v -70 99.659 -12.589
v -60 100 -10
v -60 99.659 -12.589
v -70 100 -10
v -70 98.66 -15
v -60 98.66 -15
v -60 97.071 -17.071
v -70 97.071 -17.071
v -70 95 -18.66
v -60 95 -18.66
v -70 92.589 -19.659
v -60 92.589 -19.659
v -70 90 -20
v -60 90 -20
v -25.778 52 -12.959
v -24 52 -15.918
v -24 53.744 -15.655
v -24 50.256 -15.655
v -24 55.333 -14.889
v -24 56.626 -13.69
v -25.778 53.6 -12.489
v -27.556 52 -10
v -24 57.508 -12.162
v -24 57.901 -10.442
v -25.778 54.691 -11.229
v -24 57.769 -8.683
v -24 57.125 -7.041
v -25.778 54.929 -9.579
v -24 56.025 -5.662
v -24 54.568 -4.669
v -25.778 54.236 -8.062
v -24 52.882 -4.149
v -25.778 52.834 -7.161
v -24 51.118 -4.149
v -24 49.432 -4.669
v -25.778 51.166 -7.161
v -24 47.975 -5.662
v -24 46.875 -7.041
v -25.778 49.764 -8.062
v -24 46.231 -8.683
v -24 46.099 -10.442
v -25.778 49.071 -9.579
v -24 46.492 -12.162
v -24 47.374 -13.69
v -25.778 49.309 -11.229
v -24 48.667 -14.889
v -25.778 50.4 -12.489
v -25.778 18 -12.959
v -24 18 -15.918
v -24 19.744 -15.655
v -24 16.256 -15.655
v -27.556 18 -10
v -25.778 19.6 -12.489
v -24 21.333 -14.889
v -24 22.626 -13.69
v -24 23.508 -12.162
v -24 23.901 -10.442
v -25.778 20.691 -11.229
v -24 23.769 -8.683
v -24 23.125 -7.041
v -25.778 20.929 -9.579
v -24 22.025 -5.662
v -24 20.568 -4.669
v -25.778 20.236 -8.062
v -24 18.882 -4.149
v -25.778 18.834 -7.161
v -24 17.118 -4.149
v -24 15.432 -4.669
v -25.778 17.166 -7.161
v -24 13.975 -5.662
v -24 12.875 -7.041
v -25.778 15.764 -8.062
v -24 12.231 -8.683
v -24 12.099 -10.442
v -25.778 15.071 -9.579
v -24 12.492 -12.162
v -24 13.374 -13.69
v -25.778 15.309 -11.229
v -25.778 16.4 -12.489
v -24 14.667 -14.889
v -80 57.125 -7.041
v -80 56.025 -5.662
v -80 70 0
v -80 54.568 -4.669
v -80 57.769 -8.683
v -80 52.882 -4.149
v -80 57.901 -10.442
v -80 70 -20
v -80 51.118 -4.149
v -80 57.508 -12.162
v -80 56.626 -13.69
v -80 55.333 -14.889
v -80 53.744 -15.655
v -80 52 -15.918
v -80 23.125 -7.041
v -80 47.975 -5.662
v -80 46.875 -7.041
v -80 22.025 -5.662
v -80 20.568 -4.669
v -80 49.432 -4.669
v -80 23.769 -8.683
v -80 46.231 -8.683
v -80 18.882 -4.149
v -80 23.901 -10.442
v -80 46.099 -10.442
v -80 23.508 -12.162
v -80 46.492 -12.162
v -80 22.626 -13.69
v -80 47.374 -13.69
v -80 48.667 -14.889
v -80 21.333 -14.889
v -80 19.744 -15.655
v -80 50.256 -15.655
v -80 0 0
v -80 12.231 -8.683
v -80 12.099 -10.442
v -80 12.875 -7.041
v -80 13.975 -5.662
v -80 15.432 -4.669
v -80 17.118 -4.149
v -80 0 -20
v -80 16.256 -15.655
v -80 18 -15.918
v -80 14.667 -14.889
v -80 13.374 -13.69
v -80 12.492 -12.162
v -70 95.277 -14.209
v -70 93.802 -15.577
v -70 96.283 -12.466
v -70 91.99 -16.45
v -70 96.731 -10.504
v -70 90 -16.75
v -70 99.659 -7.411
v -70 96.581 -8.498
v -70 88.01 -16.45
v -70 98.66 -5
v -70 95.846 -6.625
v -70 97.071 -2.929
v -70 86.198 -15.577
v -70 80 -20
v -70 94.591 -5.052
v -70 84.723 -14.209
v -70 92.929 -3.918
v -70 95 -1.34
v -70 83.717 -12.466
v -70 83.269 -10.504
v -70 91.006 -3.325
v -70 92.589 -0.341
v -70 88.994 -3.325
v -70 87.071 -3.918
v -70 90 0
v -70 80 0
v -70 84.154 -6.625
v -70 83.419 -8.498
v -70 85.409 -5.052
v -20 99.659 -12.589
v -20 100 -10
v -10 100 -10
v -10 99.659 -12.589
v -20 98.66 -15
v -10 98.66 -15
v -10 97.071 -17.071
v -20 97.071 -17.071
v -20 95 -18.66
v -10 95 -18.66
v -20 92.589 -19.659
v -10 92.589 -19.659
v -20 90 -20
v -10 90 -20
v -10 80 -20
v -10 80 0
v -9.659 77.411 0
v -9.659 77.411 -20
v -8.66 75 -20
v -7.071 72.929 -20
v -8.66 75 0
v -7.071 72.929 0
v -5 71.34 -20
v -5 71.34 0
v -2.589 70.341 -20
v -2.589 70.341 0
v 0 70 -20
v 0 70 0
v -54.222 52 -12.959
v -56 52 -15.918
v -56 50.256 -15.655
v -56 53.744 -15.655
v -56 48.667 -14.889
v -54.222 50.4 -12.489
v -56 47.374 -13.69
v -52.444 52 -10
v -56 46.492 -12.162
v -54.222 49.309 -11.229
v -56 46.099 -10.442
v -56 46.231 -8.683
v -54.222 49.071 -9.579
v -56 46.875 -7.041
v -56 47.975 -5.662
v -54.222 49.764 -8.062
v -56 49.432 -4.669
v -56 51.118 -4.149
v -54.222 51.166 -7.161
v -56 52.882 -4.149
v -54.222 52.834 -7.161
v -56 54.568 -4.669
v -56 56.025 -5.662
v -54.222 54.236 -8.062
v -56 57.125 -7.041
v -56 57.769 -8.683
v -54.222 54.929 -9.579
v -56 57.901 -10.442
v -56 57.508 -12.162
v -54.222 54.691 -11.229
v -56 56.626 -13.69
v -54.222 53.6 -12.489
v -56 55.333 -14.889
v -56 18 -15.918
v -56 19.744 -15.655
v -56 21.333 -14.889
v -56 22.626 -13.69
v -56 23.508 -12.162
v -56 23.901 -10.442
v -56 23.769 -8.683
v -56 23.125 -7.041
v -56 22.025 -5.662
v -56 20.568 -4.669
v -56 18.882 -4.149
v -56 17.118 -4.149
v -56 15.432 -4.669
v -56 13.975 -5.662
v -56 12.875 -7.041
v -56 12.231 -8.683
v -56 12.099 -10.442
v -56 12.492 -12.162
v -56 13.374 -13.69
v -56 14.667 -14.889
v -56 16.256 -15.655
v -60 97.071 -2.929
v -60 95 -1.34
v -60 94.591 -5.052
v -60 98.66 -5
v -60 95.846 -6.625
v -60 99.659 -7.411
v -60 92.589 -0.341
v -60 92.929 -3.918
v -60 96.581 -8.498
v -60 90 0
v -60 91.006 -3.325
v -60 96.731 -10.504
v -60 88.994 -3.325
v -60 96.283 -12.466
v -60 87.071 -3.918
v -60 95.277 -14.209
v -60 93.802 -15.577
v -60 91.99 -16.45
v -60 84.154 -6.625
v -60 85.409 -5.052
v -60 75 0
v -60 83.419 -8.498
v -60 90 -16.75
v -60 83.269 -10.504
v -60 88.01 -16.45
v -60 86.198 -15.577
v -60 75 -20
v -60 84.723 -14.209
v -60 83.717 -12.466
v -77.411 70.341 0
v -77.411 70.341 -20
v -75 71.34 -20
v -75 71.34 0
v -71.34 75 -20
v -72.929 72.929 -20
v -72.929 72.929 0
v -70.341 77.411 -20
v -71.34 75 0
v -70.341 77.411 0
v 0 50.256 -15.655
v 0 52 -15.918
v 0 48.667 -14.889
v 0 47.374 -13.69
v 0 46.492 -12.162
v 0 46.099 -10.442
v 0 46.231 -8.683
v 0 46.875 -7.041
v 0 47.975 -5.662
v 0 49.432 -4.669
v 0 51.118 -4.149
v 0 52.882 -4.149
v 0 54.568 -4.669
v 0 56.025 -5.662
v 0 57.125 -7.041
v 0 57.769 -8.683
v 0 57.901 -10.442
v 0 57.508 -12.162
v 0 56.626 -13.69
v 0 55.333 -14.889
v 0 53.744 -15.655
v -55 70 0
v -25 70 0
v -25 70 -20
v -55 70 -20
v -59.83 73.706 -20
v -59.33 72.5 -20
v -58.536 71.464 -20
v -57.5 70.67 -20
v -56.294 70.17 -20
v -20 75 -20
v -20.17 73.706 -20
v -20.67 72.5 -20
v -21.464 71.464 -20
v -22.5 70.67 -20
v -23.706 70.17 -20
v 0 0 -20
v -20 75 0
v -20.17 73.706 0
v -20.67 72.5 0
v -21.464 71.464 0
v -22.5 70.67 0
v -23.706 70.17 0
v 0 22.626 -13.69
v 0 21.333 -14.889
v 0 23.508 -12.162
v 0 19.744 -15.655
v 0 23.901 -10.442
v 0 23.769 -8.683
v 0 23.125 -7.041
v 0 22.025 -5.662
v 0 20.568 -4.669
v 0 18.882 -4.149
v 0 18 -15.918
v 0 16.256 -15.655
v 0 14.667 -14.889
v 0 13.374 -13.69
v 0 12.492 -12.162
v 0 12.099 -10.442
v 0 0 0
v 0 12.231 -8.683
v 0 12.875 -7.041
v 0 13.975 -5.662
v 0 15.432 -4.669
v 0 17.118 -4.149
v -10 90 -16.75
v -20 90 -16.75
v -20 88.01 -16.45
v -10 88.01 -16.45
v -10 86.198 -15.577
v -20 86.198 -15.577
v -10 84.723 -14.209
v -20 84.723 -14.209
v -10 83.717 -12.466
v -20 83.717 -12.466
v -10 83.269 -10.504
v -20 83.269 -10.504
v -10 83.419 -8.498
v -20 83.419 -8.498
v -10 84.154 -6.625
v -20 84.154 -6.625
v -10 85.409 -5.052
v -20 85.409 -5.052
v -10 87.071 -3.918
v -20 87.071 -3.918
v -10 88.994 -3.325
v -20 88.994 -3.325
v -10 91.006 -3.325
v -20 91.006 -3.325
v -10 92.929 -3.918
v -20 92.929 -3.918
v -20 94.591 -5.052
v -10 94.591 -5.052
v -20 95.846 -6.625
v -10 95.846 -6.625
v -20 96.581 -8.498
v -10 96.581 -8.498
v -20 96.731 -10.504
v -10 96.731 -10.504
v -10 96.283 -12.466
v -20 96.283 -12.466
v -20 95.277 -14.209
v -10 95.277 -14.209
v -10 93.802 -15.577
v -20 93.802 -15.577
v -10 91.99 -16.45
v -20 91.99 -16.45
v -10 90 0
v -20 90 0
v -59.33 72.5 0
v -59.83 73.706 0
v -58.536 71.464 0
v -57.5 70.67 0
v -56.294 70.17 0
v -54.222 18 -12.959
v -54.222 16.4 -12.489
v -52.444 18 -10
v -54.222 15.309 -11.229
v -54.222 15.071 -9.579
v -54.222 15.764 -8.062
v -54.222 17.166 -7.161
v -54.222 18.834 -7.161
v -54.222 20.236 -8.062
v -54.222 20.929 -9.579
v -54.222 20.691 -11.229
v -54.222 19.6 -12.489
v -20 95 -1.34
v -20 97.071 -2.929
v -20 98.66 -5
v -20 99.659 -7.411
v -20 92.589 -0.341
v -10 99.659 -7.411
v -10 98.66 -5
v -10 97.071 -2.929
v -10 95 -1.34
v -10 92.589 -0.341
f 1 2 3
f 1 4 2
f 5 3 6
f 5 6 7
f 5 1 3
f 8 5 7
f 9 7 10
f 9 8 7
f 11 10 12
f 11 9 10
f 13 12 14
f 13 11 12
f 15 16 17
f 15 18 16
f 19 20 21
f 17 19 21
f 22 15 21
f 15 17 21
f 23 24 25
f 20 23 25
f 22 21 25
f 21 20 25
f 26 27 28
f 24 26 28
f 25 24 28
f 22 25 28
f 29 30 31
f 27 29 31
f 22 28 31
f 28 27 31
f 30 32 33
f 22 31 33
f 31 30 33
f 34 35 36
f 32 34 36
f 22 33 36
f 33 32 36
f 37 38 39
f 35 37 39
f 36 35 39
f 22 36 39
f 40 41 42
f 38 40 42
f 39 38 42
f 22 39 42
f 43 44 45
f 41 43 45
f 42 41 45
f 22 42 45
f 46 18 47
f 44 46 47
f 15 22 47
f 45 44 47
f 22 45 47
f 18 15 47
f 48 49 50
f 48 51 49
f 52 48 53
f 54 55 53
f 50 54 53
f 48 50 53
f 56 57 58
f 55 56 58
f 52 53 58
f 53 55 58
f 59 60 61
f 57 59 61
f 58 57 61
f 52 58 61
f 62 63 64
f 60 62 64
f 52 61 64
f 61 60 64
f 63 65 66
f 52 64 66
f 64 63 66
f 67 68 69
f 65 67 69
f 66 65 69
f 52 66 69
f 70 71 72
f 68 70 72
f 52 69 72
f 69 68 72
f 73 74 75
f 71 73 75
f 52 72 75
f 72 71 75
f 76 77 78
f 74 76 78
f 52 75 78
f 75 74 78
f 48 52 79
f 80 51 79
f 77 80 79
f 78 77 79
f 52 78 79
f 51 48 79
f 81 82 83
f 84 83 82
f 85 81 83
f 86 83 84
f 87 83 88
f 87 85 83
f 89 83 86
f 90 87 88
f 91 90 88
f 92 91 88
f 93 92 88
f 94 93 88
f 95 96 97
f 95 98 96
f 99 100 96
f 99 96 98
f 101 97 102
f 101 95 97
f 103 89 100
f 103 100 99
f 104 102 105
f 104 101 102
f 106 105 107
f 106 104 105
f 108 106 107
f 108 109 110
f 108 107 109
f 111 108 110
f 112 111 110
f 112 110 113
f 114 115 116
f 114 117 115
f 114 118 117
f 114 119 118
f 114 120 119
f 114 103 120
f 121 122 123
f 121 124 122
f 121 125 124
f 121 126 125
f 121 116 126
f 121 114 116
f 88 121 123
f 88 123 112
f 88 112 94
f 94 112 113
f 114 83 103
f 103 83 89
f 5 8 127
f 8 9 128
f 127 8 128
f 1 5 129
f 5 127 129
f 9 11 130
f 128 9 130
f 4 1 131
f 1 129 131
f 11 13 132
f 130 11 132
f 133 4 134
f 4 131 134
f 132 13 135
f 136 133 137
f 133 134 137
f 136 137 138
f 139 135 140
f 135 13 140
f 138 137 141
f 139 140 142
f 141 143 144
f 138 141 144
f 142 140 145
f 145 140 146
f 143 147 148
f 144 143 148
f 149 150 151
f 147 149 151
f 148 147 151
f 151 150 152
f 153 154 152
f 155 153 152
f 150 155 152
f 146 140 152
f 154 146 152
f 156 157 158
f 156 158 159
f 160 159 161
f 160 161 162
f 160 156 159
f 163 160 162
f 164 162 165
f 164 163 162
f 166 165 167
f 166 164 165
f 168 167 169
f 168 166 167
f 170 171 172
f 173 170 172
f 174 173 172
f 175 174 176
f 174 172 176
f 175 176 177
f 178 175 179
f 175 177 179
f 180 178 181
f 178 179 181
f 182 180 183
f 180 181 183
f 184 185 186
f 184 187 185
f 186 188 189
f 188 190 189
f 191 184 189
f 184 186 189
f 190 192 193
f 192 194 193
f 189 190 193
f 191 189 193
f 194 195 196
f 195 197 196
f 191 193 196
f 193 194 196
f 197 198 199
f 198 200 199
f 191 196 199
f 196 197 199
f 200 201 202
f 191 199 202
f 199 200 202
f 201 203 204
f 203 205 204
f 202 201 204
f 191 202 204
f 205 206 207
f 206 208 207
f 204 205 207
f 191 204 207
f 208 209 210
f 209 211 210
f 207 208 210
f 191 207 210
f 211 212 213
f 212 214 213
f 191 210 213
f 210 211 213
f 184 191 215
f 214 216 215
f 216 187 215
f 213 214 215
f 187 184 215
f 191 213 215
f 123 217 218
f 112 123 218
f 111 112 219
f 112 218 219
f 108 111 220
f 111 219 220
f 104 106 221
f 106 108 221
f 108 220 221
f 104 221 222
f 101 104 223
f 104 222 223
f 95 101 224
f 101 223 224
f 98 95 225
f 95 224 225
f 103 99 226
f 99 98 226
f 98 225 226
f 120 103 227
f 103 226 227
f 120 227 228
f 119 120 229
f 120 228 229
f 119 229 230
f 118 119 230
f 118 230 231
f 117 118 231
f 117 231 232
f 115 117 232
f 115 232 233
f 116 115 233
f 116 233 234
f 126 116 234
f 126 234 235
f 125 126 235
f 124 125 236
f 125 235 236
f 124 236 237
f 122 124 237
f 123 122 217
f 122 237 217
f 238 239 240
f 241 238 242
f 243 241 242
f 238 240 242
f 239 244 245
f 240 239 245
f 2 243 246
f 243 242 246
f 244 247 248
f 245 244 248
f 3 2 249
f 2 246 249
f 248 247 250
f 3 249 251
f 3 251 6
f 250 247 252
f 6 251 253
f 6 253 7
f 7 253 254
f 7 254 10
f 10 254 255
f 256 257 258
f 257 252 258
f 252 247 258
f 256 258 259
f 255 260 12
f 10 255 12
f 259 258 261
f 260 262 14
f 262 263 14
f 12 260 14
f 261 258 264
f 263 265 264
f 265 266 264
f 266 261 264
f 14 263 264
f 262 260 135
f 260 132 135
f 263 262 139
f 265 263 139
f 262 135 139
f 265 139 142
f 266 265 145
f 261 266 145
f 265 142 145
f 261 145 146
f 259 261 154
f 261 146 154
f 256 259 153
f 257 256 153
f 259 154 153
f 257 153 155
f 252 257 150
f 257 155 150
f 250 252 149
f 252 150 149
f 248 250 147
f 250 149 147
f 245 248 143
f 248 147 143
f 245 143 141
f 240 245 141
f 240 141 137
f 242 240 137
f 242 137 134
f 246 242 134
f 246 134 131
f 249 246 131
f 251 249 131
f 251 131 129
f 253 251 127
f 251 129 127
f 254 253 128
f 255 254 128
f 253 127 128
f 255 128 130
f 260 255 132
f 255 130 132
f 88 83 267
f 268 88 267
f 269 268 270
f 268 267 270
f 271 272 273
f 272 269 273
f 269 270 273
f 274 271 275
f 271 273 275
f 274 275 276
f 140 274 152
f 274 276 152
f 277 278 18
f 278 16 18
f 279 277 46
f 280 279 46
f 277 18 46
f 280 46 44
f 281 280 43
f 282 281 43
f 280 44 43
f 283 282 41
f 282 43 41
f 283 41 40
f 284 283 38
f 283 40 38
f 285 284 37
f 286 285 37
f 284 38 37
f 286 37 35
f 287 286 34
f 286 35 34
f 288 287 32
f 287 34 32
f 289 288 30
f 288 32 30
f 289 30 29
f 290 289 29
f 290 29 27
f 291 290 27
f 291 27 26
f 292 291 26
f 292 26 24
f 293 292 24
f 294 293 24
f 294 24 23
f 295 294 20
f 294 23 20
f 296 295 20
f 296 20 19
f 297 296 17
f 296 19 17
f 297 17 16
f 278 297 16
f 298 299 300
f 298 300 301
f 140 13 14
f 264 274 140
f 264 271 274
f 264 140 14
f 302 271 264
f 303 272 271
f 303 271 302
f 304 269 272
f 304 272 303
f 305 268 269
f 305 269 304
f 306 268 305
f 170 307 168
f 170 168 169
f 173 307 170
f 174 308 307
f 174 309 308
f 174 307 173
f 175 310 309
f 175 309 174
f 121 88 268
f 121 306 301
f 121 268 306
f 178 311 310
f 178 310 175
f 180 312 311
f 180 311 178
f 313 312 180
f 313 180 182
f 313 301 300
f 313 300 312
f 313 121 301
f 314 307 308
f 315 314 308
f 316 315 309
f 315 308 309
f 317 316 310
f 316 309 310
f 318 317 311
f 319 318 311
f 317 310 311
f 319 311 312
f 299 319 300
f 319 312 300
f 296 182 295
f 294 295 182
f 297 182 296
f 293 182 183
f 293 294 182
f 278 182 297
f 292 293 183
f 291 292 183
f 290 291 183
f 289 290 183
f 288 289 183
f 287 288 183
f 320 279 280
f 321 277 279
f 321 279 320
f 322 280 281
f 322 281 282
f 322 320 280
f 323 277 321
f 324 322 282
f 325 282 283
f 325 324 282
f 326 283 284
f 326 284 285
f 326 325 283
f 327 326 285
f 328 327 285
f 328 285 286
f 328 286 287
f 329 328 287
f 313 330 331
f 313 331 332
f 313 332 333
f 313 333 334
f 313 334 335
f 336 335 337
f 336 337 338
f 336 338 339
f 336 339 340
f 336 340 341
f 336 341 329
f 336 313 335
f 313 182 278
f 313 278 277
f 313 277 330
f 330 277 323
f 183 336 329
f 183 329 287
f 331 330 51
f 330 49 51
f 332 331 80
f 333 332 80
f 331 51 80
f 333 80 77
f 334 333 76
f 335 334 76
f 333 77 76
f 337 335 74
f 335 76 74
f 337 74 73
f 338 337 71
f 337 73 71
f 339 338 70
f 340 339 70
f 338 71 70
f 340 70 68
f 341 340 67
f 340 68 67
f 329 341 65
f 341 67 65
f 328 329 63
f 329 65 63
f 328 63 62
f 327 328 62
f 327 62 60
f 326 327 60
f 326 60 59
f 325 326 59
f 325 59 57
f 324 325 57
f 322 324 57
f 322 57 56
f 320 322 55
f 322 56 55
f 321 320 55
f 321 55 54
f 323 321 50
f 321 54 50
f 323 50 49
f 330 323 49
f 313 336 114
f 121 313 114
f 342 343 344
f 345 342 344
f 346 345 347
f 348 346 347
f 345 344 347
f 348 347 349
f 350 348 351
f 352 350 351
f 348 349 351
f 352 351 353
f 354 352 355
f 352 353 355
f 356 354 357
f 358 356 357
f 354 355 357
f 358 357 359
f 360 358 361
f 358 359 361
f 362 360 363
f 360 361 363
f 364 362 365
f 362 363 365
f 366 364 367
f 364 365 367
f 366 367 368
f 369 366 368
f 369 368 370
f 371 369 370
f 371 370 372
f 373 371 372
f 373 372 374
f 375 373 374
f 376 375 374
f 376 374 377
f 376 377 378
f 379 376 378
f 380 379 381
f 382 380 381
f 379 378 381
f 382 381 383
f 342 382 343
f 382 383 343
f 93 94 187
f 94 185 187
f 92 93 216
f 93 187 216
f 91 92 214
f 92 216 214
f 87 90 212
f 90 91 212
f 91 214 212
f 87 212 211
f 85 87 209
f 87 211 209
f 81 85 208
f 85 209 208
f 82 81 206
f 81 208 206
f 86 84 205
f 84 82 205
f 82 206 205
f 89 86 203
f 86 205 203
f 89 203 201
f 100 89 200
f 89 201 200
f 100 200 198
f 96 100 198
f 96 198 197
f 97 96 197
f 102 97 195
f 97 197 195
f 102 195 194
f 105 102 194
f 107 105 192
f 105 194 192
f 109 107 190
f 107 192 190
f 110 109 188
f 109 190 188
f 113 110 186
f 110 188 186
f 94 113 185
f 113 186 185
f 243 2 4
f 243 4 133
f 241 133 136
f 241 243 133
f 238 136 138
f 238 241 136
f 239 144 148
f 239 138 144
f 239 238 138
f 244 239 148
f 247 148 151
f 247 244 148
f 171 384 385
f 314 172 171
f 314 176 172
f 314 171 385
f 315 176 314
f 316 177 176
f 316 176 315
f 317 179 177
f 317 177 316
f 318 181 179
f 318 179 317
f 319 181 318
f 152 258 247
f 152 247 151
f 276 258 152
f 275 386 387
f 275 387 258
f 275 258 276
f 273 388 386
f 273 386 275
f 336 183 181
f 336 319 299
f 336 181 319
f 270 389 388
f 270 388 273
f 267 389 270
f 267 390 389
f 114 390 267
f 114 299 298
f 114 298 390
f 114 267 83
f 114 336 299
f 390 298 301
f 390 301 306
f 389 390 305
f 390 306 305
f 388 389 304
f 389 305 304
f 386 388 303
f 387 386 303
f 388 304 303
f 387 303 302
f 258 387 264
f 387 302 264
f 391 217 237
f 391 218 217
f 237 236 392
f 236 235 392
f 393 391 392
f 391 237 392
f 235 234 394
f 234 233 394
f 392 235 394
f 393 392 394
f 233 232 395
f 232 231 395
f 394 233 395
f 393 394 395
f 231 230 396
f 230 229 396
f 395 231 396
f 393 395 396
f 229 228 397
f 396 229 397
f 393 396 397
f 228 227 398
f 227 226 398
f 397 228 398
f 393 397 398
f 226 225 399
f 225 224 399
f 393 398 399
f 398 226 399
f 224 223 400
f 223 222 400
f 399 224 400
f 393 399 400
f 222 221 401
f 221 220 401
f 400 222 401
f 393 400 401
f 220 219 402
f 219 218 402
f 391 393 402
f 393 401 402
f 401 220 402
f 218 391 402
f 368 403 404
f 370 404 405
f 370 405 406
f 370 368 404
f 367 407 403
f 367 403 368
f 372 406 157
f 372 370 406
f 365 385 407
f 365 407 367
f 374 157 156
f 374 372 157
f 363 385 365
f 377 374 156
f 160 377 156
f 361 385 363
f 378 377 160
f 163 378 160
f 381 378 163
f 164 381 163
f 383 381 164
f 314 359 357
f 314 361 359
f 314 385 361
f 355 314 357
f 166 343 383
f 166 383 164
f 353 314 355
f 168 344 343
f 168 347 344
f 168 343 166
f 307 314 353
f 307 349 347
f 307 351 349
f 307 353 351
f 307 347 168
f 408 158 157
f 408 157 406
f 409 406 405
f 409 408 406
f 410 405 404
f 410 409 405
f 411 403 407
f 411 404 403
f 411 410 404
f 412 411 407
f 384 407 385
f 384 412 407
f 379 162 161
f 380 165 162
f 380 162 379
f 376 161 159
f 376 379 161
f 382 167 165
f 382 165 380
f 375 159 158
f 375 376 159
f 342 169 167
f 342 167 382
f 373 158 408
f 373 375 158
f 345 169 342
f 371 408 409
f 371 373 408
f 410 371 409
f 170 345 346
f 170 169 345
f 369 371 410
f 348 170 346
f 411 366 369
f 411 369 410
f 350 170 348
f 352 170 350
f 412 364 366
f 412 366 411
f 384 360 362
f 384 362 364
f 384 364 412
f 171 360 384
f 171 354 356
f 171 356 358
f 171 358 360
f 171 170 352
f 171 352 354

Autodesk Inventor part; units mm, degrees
ref_plane "YZ Plane" through (0, 0, 0) normal (1, 0, 0) x (0, 1, 0)
ref_plane "XZ Plane" through (0, 0, 0) normal (0, 1, 0) x (-1, 0, 0)
sketch "Sketch1" plane through (0, 0, 0) normal (0, 1, 0) x (-1, 0, 0)
  line L0 (0, 0) -> (80, 0)
  line L1 (80, 0) -> (80, -20)
  line L2 (80, -20) -> (0, -20)
  line L3 (0, -20) -> (0, 0)
  dimension "d0" = 80
  dimension "d1" = 20
extrude "Extrusion1" add sketch "Sketch1" along normal blind 70
sketch "Sketch2" plane through (0, 70, 0) normal (0, 1, 0) x (1, 0, 0)
  line L0 (0, 20) -> (-80, 20) projected
  line L1 (-70, 0) -> (-60, 0)
  line L2 (-60, 0) -> (-60, 20)
  line L3 (-60, 20) -> (-70, 20)
  line L4 (-70, 20) -> (-70, 0)
  line L5 (-80, 0) -> (0, 0) projected
  line L6 (-10, 0) -> (-20, 0)
  line L7 (-20, 0) -> (-20, 20)
  line L8 (-20, 20) -> (-10, 20)
  line L9 (-10, 20) -> (-10, 0)
  line L10 (-40, 0) -> (-40, 20)
  dimension "d4" = 10
  dimension "d5" = 10
  dimension "d6" = 40
extrude "Extrusion2" add sketch "Sketch2" along normal blind 30 contours L9 L5 L7 L0 | L2 L1 L4 L0
hole "Hole1" at (-10, 90, -10) direction (-1, 0, 0) diameter 13.5 end through all
fillet "Fillet1" radius 5 2 edges at (-20, 70, -10) (-60, 70, -10)
fillet "Fillet2" radius 10 4 edges at (-15, 100, 0) (-65, 100, 0) (-65, 100, -20) (-15, 100, -20)
sketch "Sketch3" plane through (0, 0, 0) normal (1, 0, 0) x (0, 0, -1)
  line L0 (0, 70) -> (20, 70) projected
  line L1 (10, 70) -> (10, 0)
  line L2 (0, 0) -> (20, 0) projected
  point P0 (10, 52)
  point P1 (10, 18)
  dimension "d20" = 18
  dimension "d21" = 18
hole "Hole2" at (0, 52, -10) at (0, 18, -10) direction (-1, 0, 0) diameter 11.835 depth 24 tip angle 118 thread size "M14x2" class "6H" standard "ISO Metric profile"
ref_plane "Work Plane1" through (-40, 0, 0) normal (1, 0, 0) x (0, 0, -1)
mirror "Mirror1" about plane through (-40, 0, 0) normal (1, 0, 0) of "Hole2"
fillet "Fillet3" radius 10 2 edges at (-10, 70, -10) (-70, 70, -10)
properties part number "Profile_Middle_06" material "Aluminum 6061 T6 80 Hot Formed"
